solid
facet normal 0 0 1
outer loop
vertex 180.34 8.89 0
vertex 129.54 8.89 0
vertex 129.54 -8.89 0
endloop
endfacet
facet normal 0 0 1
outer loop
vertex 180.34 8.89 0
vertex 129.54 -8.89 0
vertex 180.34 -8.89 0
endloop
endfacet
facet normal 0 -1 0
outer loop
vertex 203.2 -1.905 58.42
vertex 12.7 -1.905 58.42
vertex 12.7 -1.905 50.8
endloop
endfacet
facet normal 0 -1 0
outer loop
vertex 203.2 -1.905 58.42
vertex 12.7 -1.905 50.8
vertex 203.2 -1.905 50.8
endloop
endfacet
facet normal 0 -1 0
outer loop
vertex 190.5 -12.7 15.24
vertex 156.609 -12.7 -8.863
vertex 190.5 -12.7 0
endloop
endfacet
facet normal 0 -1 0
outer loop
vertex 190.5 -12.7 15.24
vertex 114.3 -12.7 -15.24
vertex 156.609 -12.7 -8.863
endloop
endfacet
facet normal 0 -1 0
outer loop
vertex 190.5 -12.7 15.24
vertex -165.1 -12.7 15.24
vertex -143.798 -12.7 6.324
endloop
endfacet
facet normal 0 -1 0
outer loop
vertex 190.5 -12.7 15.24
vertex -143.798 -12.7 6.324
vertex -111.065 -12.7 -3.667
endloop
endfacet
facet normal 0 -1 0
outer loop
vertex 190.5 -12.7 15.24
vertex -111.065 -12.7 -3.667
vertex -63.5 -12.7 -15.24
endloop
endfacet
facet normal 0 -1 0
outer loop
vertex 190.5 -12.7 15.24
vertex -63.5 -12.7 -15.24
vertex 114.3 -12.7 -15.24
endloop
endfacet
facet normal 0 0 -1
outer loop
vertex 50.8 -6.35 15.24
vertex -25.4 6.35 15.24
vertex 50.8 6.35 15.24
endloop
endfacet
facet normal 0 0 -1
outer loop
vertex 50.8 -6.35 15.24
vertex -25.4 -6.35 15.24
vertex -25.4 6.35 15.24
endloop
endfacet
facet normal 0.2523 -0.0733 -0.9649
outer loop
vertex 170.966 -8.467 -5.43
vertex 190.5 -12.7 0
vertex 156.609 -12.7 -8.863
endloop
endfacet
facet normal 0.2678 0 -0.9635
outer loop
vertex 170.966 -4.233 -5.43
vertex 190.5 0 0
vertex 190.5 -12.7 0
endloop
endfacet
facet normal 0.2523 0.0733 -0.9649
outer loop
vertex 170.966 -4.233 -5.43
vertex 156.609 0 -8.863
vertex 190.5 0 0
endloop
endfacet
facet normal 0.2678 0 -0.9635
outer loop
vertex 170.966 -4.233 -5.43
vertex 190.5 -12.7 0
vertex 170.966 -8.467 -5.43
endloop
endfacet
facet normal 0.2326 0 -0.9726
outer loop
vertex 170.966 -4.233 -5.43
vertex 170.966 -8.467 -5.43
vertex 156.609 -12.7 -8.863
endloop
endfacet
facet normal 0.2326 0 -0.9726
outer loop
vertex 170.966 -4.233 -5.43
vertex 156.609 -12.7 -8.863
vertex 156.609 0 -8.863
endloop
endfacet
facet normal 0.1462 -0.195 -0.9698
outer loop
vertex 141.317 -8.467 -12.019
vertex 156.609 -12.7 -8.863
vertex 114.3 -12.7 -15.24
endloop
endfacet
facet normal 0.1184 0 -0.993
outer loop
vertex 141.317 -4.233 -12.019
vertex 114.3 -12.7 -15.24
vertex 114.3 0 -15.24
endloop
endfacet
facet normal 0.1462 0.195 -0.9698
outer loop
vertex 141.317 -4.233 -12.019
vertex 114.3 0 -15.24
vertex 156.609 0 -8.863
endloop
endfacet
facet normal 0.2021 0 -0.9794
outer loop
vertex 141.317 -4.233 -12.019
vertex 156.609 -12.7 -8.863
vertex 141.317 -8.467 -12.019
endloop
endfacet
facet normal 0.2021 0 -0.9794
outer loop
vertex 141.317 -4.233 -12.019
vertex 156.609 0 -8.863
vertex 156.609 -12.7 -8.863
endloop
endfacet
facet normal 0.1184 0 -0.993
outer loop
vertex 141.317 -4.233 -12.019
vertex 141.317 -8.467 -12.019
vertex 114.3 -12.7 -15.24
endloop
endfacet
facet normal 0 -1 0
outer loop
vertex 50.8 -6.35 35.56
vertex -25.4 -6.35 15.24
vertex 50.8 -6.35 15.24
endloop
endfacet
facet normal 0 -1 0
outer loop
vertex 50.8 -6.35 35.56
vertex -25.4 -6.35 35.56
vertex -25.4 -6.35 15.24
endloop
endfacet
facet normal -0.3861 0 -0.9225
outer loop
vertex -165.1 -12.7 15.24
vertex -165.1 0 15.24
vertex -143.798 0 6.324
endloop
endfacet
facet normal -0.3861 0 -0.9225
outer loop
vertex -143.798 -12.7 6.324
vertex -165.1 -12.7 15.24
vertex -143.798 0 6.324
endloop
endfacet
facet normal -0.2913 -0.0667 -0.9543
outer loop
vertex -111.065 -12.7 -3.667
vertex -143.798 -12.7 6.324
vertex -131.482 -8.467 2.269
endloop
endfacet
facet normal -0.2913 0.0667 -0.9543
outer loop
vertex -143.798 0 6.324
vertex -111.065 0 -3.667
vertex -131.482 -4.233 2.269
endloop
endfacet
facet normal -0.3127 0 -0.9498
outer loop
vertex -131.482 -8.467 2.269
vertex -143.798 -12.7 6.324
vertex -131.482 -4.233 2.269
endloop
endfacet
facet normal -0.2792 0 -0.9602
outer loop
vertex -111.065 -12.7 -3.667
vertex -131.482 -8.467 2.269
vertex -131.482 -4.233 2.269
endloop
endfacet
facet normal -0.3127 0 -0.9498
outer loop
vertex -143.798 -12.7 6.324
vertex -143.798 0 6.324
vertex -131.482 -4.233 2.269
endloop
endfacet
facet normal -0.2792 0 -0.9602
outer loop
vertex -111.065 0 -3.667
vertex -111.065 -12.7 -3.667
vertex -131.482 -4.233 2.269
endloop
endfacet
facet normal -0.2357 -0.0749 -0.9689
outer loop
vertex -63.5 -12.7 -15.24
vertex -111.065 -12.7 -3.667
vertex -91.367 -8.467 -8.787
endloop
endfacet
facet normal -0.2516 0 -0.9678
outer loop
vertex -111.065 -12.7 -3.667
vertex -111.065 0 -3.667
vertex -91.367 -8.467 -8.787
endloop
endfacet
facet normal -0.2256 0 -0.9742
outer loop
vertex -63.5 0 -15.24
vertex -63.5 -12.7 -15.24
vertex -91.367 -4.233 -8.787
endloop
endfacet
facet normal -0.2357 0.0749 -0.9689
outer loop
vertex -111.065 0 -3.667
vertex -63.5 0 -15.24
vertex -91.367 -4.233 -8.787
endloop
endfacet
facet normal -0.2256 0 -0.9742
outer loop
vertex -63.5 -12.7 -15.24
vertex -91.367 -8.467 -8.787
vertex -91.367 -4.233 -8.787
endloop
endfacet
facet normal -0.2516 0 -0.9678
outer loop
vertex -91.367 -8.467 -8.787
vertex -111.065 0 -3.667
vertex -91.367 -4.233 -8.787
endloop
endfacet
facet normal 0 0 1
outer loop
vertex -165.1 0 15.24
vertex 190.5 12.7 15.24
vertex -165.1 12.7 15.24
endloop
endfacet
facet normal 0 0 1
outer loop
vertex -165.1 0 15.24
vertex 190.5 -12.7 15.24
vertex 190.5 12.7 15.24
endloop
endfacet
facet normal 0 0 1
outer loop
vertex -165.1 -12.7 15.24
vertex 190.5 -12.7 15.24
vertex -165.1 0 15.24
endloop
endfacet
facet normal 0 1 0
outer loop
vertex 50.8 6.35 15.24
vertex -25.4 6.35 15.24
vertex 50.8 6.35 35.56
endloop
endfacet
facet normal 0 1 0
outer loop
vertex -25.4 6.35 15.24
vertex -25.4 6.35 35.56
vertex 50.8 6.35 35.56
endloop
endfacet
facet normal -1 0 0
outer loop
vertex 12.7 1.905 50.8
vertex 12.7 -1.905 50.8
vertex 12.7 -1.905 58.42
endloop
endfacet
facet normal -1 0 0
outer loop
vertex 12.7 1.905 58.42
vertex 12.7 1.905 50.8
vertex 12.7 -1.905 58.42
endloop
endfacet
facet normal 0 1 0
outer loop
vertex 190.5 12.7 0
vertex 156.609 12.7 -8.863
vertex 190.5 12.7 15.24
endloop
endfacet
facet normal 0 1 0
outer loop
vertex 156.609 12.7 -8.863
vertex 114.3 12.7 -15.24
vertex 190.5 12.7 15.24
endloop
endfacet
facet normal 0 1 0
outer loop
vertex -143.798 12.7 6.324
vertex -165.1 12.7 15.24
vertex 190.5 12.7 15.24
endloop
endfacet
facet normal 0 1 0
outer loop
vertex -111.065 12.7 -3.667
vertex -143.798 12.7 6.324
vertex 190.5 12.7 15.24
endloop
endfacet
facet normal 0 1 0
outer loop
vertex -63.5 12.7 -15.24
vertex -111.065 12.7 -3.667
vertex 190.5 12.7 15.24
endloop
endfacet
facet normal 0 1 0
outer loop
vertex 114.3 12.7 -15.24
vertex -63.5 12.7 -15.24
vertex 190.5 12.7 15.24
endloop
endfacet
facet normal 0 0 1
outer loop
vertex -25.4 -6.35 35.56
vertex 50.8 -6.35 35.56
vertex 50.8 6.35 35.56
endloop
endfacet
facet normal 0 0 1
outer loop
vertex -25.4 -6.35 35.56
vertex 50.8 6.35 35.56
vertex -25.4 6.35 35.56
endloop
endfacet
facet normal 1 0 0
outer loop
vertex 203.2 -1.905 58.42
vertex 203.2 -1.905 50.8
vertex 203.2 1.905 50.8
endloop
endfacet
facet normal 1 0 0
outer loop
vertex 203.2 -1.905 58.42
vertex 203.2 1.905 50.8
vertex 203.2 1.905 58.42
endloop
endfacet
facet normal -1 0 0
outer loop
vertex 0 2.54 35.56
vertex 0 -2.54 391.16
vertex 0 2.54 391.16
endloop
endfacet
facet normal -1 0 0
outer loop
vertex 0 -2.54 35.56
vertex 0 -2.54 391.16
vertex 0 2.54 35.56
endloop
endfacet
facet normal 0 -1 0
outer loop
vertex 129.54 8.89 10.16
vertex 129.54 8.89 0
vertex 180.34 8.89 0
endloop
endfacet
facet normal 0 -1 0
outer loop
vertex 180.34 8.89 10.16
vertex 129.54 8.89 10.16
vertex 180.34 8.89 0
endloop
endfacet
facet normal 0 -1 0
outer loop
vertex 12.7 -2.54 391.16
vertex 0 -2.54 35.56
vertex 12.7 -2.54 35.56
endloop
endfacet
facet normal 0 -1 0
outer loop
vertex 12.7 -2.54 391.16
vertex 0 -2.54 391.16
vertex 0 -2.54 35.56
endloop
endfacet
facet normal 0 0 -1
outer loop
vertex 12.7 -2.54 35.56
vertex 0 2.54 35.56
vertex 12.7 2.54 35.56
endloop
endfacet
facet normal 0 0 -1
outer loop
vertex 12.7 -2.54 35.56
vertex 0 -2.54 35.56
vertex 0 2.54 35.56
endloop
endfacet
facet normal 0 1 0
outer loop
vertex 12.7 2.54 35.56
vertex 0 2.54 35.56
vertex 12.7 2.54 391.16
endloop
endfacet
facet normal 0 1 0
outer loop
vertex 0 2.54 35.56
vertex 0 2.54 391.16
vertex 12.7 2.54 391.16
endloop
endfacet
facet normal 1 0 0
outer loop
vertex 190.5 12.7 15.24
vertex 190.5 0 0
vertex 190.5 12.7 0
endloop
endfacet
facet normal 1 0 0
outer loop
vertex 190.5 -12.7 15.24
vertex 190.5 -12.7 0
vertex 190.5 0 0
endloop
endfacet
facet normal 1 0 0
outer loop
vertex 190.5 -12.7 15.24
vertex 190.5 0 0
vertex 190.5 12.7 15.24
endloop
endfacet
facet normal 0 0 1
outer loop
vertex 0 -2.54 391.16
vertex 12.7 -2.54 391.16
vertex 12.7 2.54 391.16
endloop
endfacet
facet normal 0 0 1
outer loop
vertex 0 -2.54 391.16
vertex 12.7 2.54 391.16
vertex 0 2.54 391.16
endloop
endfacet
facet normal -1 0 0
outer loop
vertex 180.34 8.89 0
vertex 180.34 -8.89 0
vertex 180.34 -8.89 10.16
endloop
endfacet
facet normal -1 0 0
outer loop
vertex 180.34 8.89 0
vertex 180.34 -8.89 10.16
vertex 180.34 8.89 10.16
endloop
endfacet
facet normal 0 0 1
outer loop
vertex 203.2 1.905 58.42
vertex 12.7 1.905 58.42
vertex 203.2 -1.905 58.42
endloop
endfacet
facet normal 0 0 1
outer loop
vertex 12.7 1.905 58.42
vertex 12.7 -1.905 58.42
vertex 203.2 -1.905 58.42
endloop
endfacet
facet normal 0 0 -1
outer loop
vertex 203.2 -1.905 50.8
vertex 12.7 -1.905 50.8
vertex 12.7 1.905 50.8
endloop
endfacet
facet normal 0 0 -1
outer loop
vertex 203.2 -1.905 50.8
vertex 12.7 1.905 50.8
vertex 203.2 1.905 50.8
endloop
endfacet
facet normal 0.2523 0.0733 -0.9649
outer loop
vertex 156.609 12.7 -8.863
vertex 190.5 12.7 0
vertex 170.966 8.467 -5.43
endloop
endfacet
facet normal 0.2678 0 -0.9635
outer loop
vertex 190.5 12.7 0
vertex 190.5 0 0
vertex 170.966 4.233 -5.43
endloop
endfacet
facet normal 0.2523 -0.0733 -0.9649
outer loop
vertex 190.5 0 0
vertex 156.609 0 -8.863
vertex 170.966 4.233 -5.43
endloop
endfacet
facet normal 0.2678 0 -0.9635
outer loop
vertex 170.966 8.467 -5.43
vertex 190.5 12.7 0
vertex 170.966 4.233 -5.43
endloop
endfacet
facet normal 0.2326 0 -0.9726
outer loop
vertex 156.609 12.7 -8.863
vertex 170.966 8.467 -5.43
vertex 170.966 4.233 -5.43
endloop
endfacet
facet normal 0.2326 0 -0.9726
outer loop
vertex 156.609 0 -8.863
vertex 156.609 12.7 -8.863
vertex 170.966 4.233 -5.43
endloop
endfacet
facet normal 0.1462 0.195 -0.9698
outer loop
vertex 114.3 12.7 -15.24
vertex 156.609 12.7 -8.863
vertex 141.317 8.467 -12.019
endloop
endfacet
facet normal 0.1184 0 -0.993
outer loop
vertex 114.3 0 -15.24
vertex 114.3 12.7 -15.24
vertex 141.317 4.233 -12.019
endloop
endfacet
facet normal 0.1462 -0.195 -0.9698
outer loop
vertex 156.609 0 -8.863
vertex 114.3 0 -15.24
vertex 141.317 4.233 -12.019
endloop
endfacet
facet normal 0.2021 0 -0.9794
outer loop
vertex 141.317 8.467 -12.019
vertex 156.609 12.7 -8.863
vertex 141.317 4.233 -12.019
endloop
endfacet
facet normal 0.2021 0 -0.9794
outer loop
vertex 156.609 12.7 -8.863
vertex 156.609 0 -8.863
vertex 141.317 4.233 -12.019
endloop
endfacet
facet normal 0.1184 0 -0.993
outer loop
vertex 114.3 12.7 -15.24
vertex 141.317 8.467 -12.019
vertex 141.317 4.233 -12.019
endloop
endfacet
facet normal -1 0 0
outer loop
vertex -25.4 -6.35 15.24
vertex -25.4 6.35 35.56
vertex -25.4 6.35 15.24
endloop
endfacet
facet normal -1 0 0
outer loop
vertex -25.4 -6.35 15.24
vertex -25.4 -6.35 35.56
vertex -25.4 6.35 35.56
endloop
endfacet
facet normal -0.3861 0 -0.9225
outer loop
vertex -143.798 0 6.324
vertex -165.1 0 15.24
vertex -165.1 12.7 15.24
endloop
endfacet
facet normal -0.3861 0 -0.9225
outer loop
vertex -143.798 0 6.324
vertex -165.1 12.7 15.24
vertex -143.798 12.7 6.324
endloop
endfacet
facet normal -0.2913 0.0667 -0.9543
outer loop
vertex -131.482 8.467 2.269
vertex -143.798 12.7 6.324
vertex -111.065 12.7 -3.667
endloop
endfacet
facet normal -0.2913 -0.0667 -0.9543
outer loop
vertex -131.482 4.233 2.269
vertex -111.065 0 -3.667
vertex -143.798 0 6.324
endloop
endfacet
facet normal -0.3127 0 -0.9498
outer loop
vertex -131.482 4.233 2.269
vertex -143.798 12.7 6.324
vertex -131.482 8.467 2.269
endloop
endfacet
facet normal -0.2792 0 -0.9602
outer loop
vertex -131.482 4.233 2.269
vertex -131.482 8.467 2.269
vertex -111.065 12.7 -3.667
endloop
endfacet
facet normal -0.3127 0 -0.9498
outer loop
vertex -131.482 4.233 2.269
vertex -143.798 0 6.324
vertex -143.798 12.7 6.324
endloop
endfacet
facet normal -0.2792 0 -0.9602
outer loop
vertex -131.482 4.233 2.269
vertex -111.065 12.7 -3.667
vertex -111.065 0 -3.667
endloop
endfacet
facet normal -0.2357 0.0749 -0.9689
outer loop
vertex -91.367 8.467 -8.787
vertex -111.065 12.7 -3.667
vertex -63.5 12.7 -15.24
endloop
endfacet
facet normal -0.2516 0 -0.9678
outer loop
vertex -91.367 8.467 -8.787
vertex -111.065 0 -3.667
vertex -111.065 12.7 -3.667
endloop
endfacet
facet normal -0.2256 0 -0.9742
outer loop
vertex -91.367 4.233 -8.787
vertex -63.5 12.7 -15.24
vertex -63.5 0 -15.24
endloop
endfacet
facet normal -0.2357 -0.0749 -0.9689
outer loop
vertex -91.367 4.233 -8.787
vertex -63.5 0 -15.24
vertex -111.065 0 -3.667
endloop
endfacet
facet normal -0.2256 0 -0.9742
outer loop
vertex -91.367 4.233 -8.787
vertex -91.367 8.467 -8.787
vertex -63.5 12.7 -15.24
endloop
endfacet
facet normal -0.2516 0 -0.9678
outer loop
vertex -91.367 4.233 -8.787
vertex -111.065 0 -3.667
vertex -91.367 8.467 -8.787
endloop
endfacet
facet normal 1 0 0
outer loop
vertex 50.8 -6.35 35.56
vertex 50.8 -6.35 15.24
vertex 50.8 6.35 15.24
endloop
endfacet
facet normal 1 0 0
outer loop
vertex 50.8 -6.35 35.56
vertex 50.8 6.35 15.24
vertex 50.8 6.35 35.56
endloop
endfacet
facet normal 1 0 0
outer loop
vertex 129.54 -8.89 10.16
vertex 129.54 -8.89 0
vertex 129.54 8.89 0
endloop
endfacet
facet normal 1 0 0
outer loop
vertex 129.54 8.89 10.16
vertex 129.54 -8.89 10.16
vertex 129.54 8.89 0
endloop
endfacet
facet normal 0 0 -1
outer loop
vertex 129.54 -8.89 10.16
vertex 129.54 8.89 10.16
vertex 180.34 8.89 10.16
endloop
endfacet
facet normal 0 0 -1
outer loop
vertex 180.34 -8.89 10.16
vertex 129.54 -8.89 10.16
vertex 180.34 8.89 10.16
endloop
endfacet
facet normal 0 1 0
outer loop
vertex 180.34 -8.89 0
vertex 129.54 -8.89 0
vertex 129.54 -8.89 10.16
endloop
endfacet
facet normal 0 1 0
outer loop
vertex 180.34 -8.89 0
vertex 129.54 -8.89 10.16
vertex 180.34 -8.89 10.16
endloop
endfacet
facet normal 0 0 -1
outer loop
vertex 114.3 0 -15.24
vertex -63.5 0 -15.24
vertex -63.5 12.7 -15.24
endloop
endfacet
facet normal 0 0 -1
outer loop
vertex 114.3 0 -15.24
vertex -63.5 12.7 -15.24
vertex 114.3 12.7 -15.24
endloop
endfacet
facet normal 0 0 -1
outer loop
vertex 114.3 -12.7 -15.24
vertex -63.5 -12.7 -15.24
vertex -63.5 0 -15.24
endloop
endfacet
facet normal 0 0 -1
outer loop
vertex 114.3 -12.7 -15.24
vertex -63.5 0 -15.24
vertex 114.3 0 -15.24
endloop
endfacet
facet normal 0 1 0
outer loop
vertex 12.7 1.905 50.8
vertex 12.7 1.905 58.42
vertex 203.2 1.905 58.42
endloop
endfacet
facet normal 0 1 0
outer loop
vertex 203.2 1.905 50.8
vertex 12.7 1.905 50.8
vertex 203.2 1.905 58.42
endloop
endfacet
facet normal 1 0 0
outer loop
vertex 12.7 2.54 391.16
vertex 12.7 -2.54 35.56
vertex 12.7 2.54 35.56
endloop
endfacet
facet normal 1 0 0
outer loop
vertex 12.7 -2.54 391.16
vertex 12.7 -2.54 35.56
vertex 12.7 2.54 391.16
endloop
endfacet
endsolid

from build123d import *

# Parameters (mm, degrees)
F1_DEPTH = 12.7
F2_DEPTH = 2.54
F0_W     = 190.5
F0_H     = 7.62
F3_DEPTH = 1.905
F4_DEPTH = 6.35
F5_W     = 50.8
F5_H     = 17.78
F6_DEPTH = 10.16


# Not quite as in the source:
# - a feature names something its author has since deleted; it is built from what else it names


with BuildPart() as f1:
    # F0 (on Front) → F1 (new body, symmetric)
    with BuildSketch(Plane.XZ):
        Polygon((114.3, -15.24), (114.3, 15.24), (50.8, 15.24), (-25.4, 15.24), (-63.5, 15.24), (-63.5, -15.24), align=None)
        with BuildLine():
            add(Edge.make_bspline(
                [(-165.1, 15.24), (-140.9795414875, 2.2073420069), (-78.9946019822, -11.9854301172), (-63.5, -15.24)],
                knots=[0, 0, 0, 0, 106.0735141305, 106.0735141305, 106.0735141305, 106.0735141305], degree=3))
            Line((-63.5, -15.24), (-63.5, 15.24))
            Line((-63.5, 15.24), (-165.1, 15.24))
        make_face()
        with BuildLine():
            Line((190.5, 15.24), (114.3, 15.24))
            Line((114.3, 15.24), (114.3, -15.24))
            add(Edge.make_bspline(
                [(190.5, 0), (180.2725183696, -3.34228636), (135.7526859203, -15.2111054963), (114.3, -15.24)],
                knots=[0, 0, 0, 0, 77.7090573872, 77.7090573872, 77.7090573872, 77.7090573872], degree=3))
            Line((190.5, 0), (190.5, 15.24))
        make_face()
    extrude(amount=F1_DEPTH, both=True)

    # F5 (on Top) → F6 (cut)
    with BuildSketch(Plane.XY):
        with Locations((154.94, 0)):
            Rectangle(F5_W, F5_H)
    extrude(amount=F6_DEPTH, mode=Mode.SUBTRACT)


with BuildPart() as f2:
    # F0 (on Front) → F2 (new body, symmetric)
    with BuildSketch(Plane.XZ):
        Polygon((0, 35.56), (12.7, 35.56), (12.7, 50.8), (12.7, 58.42), (12.7, 391.16), (0, 391.16), align=None)
    extrude(amount=F2_DEPTH, both=True)


with BuildPart() as f3:
    # F0 (on Front) → F3 (new body, symmetric)
    with BuildSketch(Plane.XZ):
        with Locations((107.95, 54.61)):
            Rectangle(F0_W, F0_H)
    extrude(amount=F3_DEPTH, both=True)


with BuildPart() as f4:
    # F0 (on Front) → F4 (new body, symmetric)
    with BuildSketch(Plane.XZ):
        Polygon((-25.4, 15.24), (50.8, 15.24), (50.8, 35.56), (12.7, 35.56), (0, 35.56), (-25.4, 35.56), align=None)
    extrude(amount=F4_DEPTH, both=True)


solid = Compound([f1.part, f2.part, f3.part, f4.part])
